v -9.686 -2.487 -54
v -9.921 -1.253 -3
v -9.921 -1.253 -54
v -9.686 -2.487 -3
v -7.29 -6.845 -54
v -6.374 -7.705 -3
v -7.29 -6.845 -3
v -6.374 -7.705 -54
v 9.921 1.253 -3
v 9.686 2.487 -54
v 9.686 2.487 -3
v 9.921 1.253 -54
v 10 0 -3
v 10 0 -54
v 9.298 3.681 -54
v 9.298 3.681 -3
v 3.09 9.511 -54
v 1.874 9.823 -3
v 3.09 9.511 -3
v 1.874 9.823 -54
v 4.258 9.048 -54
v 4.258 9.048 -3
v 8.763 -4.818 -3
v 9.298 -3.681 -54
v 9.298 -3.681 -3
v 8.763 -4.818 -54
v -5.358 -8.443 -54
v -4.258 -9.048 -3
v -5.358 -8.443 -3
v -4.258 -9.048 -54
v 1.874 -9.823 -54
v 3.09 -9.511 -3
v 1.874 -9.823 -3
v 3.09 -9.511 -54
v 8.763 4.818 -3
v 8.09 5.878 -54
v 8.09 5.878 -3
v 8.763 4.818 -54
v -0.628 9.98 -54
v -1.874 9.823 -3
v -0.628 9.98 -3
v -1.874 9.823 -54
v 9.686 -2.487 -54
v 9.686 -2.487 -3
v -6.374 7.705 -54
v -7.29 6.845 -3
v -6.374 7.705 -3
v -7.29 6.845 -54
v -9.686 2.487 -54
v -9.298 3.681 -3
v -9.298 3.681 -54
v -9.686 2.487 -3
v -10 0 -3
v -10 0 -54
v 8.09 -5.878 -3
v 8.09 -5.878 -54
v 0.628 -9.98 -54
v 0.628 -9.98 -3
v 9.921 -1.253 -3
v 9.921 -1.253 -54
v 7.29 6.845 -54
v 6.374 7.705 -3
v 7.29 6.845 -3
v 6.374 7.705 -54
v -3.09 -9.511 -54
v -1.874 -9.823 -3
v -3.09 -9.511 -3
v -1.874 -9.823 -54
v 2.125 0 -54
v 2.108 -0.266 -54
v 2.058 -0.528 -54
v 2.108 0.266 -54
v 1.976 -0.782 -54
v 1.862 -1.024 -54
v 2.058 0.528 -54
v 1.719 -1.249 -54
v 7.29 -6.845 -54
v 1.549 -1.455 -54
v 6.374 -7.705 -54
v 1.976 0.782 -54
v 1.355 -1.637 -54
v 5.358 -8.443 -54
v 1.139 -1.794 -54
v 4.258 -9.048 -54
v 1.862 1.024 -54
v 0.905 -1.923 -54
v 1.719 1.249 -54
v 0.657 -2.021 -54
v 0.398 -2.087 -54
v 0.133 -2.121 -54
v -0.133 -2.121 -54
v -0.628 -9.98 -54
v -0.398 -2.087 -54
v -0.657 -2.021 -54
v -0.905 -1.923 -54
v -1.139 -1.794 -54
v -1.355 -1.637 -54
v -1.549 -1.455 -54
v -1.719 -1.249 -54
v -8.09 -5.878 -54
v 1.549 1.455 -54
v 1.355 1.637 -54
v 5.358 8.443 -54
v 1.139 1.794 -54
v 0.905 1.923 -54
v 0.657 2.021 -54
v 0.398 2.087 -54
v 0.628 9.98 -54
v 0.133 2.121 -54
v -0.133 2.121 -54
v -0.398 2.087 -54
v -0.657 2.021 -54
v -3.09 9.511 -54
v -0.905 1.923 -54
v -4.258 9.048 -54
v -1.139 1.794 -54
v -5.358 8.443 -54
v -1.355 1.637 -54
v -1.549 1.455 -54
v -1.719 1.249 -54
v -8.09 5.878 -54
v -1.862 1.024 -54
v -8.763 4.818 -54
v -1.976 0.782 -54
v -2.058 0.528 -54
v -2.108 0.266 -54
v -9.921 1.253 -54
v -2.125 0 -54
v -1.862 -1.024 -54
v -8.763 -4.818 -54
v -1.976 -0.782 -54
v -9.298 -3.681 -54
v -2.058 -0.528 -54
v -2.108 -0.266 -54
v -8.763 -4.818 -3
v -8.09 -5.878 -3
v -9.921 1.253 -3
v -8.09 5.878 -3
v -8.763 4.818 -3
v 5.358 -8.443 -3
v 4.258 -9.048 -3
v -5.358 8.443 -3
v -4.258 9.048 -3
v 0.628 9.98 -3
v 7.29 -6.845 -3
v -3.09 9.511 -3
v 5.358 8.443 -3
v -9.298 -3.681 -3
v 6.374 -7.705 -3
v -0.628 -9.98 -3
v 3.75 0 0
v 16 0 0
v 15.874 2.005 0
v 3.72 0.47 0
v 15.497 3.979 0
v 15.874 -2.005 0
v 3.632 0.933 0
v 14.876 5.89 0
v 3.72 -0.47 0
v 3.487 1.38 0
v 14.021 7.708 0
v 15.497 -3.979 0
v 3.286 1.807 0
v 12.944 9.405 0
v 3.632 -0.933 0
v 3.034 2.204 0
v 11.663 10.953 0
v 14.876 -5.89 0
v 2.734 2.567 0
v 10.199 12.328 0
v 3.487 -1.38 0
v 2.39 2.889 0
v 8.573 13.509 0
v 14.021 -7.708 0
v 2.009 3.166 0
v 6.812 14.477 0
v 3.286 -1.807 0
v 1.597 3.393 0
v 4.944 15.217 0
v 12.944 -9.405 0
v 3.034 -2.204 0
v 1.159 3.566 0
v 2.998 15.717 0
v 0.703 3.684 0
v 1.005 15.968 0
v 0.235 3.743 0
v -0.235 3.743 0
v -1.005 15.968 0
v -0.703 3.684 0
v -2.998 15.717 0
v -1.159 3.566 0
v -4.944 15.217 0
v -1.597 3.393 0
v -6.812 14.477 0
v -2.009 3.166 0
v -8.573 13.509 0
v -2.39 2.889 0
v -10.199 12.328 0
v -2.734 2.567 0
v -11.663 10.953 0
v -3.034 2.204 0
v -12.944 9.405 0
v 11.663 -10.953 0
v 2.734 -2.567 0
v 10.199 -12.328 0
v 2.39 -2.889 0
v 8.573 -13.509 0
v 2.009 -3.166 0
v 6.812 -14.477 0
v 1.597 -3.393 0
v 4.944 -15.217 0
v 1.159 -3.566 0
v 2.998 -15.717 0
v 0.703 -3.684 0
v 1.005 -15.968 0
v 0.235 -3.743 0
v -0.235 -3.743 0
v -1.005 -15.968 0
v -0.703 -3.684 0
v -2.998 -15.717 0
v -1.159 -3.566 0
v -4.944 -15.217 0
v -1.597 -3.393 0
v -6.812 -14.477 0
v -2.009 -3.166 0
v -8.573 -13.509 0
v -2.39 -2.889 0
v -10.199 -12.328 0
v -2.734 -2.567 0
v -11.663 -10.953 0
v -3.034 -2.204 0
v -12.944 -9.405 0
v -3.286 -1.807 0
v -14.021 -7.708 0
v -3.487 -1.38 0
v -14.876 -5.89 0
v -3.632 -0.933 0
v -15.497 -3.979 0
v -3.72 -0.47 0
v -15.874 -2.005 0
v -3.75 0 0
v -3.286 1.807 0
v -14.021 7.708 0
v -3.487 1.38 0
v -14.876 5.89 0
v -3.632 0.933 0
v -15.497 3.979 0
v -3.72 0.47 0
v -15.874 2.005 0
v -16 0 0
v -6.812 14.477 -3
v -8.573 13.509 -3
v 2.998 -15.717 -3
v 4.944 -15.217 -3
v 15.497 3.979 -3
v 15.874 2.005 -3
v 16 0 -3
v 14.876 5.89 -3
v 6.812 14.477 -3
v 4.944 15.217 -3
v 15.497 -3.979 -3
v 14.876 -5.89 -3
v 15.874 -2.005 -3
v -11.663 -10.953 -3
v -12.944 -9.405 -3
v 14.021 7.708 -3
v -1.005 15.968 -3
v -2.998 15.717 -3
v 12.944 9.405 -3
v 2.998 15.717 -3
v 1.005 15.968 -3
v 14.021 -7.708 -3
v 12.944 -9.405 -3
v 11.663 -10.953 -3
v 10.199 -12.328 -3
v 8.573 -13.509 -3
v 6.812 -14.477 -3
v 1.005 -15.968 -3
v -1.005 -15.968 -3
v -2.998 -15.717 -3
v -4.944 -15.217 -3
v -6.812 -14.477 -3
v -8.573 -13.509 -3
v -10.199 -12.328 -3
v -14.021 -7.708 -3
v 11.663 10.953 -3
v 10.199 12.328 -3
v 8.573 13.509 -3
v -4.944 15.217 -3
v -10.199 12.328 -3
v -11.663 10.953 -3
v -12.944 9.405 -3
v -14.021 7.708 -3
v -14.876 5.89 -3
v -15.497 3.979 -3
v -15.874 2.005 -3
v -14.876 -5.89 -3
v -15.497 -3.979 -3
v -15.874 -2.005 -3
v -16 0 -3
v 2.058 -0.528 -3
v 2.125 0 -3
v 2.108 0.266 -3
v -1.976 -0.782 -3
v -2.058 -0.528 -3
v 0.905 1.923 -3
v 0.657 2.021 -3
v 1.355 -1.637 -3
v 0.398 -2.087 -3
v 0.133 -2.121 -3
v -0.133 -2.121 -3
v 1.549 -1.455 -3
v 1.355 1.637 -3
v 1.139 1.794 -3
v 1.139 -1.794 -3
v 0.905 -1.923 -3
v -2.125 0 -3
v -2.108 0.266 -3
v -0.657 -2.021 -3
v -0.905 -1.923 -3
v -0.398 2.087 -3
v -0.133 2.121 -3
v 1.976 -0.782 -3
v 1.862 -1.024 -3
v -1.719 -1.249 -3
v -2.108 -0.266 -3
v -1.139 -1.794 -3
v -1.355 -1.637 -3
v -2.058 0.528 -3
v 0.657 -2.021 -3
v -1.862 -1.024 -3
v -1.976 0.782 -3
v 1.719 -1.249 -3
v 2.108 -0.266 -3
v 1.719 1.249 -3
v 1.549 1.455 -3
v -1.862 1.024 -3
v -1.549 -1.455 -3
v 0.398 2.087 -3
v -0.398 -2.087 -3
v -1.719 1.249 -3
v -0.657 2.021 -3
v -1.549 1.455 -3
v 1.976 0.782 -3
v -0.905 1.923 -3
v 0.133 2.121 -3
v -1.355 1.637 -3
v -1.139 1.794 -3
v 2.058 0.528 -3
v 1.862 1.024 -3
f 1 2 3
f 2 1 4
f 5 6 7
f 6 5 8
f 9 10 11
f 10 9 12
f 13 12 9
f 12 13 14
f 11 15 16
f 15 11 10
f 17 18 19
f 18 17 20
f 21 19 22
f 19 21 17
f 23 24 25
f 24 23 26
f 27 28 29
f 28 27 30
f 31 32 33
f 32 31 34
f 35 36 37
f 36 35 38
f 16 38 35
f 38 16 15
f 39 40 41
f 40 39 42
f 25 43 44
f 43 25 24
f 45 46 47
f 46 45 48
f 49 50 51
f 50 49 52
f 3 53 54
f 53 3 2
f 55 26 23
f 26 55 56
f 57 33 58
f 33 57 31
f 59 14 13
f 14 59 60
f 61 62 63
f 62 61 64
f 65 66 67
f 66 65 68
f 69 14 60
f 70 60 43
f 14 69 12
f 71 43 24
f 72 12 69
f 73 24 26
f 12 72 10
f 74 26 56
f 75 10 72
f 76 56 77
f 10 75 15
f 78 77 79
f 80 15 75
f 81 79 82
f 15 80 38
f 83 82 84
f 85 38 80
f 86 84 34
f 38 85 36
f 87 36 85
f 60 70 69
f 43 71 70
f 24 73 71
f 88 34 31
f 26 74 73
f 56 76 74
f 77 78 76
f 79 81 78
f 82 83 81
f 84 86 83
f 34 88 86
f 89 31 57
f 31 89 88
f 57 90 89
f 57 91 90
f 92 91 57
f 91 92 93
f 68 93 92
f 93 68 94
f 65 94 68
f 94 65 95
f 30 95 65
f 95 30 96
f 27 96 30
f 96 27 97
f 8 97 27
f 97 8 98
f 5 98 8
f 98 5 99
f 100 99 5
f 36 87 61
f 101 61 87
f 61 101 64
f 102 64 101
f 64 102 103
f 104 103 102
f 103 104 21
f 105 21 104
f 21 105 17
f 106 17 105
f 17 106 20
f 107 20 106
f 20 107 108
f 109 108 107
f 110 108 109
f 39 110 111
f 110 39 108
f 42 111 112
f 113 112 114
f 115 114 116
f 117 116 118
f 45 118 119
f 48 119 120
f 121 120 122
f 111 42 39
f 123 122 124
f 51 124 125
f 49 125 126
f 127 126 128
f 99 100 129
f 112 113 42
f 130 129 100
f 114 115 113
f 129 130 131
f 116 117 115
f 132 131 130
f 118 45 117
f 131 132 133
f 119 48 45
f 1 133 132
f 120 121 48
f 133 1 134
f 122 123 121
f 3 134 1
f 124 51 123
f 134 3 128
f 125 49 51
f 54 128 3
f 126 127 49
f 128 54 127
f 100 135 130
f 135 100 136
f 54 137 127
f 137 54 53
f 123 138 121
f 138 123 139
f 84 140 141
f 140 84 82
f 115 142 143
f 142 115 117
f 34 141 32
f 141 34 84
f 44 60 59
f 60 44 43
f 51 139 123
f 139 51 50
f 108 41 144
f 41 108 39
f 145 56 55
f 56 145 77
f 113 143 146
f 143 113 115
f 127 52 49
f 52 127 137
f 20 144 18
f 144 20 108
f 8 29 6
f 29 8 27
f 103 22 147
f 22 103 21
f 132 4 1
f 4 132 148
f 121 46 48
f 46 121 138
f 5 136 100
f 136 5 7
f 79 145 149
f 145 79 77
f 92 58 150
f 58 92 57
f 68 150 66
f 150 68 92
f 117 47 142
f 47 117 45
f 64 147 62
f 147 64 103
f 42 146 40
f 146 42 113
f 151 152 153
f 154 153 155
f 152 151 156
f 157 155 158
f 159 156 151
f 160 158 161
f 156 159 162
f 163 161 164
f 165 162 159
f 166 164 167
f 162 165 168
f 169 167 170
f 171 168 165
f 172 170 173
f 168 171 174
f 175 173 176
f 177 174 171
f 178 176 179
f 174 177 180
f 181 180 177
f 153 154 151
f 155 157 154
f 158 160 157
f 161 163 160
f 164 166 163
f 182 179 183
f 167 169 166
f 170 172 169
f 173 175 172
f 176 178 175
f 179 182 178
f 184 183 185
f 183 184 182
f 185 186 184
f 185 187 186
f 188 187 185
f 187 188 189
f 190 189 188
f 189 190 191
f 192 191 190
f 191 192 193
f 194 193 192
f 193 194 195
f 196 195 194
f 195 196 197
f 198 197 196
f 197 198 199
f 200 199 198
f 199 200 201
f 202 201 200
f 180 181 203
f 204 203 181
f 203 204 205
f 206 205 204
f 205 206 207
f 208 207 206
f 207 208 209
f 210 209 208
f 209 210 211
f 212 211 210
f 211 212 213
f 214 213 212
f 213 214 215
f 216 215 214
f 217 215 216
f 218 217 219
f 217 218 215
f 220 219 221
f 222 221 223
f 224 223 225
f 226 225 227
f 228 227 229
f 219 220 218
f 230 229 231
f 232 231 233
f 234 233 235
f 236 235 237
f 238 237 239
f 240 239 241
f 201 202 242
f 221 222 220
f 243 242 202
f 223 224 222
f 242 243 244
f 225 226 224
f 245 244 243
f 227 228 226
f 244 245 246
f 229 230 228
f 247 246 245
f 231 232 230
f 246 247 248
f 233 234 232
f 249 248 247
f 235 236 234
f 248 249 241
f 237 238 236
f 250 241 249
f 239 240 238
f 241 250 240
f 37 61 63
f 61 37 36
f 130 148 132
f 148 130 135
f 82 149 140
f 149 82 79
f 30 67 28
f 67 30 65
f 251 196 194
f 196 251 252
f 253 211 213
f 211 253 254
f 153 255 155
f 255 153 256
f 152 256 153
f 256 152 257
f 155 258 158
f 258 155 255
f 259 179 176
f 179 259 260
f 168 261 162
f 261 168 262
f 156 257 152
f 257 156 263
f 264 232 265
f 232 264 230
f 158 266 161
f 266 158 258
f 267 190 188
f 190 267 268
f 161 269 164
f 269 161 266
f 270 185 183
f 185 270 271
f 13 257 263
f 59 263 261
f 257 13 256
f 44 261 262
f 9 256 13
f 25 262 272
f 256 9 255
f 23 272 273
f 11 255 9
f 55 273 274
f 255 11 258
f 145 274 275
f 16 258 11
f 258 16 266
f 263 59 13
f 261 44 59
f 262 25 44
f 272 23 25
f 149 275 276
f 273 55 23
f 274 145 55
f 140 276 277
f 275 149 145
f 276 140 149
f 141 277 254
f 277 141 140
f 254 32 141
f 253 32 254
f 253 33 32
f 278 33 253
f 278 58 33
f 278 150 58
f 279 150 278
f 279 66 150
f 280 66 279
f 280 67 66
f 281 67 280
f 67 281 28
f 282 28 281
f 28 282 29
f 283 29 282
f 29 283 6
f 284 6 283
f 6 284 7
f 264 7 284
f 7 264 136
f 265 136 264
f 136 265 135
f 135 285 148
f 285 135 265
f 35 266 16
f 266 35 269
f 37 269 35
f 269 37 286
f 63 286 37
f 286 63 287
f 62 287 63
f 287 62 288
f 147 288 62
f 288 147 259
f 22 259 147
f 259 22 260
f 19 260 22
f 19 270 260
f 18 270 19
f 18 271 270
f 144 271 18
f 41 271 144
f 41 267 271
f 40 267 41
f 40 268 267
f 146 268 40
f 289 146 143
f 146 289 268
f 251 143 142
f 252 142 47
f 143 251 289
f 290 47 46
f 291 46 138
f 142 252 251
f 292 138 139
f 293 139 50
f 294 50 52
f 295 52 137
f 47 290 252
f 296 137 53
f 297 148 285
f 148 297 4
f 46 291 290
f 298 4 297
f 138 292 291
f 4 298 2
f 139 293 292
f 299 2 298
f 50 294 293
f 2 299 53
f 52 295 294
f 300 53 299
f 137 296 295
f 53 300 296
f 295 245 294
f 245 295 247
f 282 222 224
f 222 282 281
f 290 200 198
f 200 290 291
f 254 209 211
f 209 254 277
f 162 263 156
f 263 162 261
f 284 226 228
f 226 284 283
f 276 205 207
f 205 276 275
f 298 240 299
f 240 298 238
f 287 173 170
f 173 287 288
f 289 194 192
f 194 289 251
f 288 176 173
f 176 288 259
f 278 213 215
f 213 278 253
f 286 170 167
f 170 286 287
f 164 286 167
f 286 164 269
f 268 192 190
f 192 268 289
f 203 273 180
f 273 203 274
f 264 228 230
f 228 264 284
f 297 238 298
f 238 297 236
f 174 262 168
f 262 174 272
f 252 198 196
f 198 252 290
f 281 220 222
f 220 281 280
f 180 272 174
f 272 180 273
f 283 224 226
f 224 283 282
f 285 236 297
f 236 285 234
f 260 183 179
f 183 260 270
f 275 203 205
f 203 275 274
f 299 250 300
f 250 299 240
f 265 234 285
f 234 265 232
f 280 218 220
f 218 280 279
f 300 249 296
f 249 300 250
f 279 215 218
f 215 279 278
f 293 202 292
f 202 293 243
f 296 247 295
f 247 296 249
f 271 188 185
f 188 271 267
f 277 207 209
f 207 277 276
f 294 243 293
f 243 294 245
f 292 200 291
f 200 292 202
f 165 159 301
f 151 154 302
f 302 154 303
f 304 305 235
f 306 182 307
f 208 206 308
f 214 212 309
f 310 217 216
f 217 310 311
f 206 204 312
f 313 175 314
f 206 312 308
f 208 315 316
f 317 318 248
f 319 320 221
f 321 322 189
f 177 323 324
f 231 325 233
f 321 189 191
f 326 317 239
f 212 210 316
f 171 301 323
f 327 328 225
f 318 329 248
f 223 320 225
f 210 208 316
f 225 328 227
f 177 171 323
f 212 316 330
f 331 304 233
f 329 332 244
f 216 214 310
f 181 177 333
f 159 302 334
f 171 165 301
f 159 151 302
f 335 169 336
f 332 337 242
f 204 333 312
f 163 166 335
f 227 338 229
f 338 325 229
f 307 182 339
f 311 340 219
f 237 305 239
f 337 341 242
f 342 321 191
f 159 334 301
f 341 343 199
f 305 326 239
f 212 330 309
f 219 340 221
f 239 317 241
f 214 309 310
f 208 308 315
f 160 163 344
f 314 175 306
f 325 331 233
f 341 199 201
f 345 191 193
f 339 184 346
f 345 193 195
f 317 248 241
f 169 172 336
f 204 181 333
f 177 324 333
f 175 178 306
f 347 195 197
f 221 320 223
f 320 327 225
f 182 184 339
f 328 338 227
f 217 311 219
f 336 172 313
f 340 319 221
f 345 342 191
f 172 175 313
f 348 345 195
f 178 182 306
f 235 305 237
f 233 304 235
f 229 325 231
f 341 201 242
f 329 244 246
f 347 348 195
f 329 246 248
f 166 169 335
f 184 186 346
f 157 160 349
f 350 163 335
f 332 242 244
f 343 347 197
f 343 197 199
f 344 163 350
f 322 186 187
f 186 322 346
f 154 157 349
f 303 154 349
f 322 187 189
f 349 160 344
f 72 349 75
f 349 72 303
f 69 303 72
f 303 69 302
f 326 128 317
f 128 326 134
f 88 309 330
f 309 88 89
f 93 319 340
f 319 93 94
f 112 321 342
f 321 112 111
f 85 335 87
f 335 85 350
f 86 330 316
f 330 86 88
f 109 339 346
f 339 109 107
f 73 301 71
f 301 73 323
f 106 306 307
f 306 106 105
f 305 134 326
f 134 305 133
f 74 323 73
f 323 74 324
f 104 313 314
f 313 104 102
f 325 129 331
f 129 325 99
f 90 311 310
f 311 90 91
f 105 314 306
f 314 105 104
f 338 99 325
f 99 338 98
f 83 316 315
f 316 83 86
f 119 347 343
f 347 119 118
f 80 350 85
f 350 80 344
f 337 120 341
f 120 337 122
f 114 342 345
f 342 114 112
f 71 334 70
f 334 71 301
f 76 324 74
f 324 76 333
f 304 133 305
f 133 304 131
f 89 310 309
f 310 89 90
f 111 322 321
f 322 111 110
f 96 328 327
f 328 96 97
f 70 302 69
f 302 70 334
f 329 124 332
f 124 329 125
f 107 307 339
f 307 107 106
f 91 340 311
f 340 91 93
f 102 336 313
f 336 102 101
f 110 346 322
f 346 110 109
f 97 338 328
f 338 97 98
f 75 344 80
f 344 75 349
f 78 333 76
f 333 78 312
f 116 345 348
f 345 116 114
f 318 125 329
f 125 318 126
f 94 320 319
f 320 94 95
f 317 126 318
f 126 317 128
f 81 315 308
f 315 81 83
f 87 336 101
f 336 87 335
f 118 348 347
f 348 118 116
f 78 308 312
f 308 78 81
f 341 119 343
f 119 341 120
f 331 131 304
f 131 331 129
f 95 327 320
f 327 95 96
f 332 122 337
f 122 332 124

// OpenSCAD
$fn = 50;


difference() {
	union() {
		translate(v = [0, 0, -54.0000000000]) {
			cylinder(h = 54, r = 10.0000000000);
		}
		translate(v = [0, 0, -3.0000000000]) {
			cylinder(h = 3, r = 16.0000000000);
		}
	}
	union() {
		translate(v = [0, 0, 0]) {
			rotate(a = [0, 0, 0]) {
				difference() {
					union() {
						#translate(v = [0, 0, -54.0000000000]) {
							cylinder(h = 54, r = 2.0000000000);
						}
						#translate(v = [0, 0, -3]) {
							cylinder(h = 3, r1 = 2.1250000000, r2 = 3.7500000000);
						}
						#translate(v = [0, 0, -54.0000000000]) {
							cylinder(h = 54, r = 2.1250000000);
						}
						#translate(v = [0, 0, -54.0000000000]) {
							cylinder(h = 54, r = 2.0000000000);
						}
					}
					union();
				}
			}
		}
	}
}
